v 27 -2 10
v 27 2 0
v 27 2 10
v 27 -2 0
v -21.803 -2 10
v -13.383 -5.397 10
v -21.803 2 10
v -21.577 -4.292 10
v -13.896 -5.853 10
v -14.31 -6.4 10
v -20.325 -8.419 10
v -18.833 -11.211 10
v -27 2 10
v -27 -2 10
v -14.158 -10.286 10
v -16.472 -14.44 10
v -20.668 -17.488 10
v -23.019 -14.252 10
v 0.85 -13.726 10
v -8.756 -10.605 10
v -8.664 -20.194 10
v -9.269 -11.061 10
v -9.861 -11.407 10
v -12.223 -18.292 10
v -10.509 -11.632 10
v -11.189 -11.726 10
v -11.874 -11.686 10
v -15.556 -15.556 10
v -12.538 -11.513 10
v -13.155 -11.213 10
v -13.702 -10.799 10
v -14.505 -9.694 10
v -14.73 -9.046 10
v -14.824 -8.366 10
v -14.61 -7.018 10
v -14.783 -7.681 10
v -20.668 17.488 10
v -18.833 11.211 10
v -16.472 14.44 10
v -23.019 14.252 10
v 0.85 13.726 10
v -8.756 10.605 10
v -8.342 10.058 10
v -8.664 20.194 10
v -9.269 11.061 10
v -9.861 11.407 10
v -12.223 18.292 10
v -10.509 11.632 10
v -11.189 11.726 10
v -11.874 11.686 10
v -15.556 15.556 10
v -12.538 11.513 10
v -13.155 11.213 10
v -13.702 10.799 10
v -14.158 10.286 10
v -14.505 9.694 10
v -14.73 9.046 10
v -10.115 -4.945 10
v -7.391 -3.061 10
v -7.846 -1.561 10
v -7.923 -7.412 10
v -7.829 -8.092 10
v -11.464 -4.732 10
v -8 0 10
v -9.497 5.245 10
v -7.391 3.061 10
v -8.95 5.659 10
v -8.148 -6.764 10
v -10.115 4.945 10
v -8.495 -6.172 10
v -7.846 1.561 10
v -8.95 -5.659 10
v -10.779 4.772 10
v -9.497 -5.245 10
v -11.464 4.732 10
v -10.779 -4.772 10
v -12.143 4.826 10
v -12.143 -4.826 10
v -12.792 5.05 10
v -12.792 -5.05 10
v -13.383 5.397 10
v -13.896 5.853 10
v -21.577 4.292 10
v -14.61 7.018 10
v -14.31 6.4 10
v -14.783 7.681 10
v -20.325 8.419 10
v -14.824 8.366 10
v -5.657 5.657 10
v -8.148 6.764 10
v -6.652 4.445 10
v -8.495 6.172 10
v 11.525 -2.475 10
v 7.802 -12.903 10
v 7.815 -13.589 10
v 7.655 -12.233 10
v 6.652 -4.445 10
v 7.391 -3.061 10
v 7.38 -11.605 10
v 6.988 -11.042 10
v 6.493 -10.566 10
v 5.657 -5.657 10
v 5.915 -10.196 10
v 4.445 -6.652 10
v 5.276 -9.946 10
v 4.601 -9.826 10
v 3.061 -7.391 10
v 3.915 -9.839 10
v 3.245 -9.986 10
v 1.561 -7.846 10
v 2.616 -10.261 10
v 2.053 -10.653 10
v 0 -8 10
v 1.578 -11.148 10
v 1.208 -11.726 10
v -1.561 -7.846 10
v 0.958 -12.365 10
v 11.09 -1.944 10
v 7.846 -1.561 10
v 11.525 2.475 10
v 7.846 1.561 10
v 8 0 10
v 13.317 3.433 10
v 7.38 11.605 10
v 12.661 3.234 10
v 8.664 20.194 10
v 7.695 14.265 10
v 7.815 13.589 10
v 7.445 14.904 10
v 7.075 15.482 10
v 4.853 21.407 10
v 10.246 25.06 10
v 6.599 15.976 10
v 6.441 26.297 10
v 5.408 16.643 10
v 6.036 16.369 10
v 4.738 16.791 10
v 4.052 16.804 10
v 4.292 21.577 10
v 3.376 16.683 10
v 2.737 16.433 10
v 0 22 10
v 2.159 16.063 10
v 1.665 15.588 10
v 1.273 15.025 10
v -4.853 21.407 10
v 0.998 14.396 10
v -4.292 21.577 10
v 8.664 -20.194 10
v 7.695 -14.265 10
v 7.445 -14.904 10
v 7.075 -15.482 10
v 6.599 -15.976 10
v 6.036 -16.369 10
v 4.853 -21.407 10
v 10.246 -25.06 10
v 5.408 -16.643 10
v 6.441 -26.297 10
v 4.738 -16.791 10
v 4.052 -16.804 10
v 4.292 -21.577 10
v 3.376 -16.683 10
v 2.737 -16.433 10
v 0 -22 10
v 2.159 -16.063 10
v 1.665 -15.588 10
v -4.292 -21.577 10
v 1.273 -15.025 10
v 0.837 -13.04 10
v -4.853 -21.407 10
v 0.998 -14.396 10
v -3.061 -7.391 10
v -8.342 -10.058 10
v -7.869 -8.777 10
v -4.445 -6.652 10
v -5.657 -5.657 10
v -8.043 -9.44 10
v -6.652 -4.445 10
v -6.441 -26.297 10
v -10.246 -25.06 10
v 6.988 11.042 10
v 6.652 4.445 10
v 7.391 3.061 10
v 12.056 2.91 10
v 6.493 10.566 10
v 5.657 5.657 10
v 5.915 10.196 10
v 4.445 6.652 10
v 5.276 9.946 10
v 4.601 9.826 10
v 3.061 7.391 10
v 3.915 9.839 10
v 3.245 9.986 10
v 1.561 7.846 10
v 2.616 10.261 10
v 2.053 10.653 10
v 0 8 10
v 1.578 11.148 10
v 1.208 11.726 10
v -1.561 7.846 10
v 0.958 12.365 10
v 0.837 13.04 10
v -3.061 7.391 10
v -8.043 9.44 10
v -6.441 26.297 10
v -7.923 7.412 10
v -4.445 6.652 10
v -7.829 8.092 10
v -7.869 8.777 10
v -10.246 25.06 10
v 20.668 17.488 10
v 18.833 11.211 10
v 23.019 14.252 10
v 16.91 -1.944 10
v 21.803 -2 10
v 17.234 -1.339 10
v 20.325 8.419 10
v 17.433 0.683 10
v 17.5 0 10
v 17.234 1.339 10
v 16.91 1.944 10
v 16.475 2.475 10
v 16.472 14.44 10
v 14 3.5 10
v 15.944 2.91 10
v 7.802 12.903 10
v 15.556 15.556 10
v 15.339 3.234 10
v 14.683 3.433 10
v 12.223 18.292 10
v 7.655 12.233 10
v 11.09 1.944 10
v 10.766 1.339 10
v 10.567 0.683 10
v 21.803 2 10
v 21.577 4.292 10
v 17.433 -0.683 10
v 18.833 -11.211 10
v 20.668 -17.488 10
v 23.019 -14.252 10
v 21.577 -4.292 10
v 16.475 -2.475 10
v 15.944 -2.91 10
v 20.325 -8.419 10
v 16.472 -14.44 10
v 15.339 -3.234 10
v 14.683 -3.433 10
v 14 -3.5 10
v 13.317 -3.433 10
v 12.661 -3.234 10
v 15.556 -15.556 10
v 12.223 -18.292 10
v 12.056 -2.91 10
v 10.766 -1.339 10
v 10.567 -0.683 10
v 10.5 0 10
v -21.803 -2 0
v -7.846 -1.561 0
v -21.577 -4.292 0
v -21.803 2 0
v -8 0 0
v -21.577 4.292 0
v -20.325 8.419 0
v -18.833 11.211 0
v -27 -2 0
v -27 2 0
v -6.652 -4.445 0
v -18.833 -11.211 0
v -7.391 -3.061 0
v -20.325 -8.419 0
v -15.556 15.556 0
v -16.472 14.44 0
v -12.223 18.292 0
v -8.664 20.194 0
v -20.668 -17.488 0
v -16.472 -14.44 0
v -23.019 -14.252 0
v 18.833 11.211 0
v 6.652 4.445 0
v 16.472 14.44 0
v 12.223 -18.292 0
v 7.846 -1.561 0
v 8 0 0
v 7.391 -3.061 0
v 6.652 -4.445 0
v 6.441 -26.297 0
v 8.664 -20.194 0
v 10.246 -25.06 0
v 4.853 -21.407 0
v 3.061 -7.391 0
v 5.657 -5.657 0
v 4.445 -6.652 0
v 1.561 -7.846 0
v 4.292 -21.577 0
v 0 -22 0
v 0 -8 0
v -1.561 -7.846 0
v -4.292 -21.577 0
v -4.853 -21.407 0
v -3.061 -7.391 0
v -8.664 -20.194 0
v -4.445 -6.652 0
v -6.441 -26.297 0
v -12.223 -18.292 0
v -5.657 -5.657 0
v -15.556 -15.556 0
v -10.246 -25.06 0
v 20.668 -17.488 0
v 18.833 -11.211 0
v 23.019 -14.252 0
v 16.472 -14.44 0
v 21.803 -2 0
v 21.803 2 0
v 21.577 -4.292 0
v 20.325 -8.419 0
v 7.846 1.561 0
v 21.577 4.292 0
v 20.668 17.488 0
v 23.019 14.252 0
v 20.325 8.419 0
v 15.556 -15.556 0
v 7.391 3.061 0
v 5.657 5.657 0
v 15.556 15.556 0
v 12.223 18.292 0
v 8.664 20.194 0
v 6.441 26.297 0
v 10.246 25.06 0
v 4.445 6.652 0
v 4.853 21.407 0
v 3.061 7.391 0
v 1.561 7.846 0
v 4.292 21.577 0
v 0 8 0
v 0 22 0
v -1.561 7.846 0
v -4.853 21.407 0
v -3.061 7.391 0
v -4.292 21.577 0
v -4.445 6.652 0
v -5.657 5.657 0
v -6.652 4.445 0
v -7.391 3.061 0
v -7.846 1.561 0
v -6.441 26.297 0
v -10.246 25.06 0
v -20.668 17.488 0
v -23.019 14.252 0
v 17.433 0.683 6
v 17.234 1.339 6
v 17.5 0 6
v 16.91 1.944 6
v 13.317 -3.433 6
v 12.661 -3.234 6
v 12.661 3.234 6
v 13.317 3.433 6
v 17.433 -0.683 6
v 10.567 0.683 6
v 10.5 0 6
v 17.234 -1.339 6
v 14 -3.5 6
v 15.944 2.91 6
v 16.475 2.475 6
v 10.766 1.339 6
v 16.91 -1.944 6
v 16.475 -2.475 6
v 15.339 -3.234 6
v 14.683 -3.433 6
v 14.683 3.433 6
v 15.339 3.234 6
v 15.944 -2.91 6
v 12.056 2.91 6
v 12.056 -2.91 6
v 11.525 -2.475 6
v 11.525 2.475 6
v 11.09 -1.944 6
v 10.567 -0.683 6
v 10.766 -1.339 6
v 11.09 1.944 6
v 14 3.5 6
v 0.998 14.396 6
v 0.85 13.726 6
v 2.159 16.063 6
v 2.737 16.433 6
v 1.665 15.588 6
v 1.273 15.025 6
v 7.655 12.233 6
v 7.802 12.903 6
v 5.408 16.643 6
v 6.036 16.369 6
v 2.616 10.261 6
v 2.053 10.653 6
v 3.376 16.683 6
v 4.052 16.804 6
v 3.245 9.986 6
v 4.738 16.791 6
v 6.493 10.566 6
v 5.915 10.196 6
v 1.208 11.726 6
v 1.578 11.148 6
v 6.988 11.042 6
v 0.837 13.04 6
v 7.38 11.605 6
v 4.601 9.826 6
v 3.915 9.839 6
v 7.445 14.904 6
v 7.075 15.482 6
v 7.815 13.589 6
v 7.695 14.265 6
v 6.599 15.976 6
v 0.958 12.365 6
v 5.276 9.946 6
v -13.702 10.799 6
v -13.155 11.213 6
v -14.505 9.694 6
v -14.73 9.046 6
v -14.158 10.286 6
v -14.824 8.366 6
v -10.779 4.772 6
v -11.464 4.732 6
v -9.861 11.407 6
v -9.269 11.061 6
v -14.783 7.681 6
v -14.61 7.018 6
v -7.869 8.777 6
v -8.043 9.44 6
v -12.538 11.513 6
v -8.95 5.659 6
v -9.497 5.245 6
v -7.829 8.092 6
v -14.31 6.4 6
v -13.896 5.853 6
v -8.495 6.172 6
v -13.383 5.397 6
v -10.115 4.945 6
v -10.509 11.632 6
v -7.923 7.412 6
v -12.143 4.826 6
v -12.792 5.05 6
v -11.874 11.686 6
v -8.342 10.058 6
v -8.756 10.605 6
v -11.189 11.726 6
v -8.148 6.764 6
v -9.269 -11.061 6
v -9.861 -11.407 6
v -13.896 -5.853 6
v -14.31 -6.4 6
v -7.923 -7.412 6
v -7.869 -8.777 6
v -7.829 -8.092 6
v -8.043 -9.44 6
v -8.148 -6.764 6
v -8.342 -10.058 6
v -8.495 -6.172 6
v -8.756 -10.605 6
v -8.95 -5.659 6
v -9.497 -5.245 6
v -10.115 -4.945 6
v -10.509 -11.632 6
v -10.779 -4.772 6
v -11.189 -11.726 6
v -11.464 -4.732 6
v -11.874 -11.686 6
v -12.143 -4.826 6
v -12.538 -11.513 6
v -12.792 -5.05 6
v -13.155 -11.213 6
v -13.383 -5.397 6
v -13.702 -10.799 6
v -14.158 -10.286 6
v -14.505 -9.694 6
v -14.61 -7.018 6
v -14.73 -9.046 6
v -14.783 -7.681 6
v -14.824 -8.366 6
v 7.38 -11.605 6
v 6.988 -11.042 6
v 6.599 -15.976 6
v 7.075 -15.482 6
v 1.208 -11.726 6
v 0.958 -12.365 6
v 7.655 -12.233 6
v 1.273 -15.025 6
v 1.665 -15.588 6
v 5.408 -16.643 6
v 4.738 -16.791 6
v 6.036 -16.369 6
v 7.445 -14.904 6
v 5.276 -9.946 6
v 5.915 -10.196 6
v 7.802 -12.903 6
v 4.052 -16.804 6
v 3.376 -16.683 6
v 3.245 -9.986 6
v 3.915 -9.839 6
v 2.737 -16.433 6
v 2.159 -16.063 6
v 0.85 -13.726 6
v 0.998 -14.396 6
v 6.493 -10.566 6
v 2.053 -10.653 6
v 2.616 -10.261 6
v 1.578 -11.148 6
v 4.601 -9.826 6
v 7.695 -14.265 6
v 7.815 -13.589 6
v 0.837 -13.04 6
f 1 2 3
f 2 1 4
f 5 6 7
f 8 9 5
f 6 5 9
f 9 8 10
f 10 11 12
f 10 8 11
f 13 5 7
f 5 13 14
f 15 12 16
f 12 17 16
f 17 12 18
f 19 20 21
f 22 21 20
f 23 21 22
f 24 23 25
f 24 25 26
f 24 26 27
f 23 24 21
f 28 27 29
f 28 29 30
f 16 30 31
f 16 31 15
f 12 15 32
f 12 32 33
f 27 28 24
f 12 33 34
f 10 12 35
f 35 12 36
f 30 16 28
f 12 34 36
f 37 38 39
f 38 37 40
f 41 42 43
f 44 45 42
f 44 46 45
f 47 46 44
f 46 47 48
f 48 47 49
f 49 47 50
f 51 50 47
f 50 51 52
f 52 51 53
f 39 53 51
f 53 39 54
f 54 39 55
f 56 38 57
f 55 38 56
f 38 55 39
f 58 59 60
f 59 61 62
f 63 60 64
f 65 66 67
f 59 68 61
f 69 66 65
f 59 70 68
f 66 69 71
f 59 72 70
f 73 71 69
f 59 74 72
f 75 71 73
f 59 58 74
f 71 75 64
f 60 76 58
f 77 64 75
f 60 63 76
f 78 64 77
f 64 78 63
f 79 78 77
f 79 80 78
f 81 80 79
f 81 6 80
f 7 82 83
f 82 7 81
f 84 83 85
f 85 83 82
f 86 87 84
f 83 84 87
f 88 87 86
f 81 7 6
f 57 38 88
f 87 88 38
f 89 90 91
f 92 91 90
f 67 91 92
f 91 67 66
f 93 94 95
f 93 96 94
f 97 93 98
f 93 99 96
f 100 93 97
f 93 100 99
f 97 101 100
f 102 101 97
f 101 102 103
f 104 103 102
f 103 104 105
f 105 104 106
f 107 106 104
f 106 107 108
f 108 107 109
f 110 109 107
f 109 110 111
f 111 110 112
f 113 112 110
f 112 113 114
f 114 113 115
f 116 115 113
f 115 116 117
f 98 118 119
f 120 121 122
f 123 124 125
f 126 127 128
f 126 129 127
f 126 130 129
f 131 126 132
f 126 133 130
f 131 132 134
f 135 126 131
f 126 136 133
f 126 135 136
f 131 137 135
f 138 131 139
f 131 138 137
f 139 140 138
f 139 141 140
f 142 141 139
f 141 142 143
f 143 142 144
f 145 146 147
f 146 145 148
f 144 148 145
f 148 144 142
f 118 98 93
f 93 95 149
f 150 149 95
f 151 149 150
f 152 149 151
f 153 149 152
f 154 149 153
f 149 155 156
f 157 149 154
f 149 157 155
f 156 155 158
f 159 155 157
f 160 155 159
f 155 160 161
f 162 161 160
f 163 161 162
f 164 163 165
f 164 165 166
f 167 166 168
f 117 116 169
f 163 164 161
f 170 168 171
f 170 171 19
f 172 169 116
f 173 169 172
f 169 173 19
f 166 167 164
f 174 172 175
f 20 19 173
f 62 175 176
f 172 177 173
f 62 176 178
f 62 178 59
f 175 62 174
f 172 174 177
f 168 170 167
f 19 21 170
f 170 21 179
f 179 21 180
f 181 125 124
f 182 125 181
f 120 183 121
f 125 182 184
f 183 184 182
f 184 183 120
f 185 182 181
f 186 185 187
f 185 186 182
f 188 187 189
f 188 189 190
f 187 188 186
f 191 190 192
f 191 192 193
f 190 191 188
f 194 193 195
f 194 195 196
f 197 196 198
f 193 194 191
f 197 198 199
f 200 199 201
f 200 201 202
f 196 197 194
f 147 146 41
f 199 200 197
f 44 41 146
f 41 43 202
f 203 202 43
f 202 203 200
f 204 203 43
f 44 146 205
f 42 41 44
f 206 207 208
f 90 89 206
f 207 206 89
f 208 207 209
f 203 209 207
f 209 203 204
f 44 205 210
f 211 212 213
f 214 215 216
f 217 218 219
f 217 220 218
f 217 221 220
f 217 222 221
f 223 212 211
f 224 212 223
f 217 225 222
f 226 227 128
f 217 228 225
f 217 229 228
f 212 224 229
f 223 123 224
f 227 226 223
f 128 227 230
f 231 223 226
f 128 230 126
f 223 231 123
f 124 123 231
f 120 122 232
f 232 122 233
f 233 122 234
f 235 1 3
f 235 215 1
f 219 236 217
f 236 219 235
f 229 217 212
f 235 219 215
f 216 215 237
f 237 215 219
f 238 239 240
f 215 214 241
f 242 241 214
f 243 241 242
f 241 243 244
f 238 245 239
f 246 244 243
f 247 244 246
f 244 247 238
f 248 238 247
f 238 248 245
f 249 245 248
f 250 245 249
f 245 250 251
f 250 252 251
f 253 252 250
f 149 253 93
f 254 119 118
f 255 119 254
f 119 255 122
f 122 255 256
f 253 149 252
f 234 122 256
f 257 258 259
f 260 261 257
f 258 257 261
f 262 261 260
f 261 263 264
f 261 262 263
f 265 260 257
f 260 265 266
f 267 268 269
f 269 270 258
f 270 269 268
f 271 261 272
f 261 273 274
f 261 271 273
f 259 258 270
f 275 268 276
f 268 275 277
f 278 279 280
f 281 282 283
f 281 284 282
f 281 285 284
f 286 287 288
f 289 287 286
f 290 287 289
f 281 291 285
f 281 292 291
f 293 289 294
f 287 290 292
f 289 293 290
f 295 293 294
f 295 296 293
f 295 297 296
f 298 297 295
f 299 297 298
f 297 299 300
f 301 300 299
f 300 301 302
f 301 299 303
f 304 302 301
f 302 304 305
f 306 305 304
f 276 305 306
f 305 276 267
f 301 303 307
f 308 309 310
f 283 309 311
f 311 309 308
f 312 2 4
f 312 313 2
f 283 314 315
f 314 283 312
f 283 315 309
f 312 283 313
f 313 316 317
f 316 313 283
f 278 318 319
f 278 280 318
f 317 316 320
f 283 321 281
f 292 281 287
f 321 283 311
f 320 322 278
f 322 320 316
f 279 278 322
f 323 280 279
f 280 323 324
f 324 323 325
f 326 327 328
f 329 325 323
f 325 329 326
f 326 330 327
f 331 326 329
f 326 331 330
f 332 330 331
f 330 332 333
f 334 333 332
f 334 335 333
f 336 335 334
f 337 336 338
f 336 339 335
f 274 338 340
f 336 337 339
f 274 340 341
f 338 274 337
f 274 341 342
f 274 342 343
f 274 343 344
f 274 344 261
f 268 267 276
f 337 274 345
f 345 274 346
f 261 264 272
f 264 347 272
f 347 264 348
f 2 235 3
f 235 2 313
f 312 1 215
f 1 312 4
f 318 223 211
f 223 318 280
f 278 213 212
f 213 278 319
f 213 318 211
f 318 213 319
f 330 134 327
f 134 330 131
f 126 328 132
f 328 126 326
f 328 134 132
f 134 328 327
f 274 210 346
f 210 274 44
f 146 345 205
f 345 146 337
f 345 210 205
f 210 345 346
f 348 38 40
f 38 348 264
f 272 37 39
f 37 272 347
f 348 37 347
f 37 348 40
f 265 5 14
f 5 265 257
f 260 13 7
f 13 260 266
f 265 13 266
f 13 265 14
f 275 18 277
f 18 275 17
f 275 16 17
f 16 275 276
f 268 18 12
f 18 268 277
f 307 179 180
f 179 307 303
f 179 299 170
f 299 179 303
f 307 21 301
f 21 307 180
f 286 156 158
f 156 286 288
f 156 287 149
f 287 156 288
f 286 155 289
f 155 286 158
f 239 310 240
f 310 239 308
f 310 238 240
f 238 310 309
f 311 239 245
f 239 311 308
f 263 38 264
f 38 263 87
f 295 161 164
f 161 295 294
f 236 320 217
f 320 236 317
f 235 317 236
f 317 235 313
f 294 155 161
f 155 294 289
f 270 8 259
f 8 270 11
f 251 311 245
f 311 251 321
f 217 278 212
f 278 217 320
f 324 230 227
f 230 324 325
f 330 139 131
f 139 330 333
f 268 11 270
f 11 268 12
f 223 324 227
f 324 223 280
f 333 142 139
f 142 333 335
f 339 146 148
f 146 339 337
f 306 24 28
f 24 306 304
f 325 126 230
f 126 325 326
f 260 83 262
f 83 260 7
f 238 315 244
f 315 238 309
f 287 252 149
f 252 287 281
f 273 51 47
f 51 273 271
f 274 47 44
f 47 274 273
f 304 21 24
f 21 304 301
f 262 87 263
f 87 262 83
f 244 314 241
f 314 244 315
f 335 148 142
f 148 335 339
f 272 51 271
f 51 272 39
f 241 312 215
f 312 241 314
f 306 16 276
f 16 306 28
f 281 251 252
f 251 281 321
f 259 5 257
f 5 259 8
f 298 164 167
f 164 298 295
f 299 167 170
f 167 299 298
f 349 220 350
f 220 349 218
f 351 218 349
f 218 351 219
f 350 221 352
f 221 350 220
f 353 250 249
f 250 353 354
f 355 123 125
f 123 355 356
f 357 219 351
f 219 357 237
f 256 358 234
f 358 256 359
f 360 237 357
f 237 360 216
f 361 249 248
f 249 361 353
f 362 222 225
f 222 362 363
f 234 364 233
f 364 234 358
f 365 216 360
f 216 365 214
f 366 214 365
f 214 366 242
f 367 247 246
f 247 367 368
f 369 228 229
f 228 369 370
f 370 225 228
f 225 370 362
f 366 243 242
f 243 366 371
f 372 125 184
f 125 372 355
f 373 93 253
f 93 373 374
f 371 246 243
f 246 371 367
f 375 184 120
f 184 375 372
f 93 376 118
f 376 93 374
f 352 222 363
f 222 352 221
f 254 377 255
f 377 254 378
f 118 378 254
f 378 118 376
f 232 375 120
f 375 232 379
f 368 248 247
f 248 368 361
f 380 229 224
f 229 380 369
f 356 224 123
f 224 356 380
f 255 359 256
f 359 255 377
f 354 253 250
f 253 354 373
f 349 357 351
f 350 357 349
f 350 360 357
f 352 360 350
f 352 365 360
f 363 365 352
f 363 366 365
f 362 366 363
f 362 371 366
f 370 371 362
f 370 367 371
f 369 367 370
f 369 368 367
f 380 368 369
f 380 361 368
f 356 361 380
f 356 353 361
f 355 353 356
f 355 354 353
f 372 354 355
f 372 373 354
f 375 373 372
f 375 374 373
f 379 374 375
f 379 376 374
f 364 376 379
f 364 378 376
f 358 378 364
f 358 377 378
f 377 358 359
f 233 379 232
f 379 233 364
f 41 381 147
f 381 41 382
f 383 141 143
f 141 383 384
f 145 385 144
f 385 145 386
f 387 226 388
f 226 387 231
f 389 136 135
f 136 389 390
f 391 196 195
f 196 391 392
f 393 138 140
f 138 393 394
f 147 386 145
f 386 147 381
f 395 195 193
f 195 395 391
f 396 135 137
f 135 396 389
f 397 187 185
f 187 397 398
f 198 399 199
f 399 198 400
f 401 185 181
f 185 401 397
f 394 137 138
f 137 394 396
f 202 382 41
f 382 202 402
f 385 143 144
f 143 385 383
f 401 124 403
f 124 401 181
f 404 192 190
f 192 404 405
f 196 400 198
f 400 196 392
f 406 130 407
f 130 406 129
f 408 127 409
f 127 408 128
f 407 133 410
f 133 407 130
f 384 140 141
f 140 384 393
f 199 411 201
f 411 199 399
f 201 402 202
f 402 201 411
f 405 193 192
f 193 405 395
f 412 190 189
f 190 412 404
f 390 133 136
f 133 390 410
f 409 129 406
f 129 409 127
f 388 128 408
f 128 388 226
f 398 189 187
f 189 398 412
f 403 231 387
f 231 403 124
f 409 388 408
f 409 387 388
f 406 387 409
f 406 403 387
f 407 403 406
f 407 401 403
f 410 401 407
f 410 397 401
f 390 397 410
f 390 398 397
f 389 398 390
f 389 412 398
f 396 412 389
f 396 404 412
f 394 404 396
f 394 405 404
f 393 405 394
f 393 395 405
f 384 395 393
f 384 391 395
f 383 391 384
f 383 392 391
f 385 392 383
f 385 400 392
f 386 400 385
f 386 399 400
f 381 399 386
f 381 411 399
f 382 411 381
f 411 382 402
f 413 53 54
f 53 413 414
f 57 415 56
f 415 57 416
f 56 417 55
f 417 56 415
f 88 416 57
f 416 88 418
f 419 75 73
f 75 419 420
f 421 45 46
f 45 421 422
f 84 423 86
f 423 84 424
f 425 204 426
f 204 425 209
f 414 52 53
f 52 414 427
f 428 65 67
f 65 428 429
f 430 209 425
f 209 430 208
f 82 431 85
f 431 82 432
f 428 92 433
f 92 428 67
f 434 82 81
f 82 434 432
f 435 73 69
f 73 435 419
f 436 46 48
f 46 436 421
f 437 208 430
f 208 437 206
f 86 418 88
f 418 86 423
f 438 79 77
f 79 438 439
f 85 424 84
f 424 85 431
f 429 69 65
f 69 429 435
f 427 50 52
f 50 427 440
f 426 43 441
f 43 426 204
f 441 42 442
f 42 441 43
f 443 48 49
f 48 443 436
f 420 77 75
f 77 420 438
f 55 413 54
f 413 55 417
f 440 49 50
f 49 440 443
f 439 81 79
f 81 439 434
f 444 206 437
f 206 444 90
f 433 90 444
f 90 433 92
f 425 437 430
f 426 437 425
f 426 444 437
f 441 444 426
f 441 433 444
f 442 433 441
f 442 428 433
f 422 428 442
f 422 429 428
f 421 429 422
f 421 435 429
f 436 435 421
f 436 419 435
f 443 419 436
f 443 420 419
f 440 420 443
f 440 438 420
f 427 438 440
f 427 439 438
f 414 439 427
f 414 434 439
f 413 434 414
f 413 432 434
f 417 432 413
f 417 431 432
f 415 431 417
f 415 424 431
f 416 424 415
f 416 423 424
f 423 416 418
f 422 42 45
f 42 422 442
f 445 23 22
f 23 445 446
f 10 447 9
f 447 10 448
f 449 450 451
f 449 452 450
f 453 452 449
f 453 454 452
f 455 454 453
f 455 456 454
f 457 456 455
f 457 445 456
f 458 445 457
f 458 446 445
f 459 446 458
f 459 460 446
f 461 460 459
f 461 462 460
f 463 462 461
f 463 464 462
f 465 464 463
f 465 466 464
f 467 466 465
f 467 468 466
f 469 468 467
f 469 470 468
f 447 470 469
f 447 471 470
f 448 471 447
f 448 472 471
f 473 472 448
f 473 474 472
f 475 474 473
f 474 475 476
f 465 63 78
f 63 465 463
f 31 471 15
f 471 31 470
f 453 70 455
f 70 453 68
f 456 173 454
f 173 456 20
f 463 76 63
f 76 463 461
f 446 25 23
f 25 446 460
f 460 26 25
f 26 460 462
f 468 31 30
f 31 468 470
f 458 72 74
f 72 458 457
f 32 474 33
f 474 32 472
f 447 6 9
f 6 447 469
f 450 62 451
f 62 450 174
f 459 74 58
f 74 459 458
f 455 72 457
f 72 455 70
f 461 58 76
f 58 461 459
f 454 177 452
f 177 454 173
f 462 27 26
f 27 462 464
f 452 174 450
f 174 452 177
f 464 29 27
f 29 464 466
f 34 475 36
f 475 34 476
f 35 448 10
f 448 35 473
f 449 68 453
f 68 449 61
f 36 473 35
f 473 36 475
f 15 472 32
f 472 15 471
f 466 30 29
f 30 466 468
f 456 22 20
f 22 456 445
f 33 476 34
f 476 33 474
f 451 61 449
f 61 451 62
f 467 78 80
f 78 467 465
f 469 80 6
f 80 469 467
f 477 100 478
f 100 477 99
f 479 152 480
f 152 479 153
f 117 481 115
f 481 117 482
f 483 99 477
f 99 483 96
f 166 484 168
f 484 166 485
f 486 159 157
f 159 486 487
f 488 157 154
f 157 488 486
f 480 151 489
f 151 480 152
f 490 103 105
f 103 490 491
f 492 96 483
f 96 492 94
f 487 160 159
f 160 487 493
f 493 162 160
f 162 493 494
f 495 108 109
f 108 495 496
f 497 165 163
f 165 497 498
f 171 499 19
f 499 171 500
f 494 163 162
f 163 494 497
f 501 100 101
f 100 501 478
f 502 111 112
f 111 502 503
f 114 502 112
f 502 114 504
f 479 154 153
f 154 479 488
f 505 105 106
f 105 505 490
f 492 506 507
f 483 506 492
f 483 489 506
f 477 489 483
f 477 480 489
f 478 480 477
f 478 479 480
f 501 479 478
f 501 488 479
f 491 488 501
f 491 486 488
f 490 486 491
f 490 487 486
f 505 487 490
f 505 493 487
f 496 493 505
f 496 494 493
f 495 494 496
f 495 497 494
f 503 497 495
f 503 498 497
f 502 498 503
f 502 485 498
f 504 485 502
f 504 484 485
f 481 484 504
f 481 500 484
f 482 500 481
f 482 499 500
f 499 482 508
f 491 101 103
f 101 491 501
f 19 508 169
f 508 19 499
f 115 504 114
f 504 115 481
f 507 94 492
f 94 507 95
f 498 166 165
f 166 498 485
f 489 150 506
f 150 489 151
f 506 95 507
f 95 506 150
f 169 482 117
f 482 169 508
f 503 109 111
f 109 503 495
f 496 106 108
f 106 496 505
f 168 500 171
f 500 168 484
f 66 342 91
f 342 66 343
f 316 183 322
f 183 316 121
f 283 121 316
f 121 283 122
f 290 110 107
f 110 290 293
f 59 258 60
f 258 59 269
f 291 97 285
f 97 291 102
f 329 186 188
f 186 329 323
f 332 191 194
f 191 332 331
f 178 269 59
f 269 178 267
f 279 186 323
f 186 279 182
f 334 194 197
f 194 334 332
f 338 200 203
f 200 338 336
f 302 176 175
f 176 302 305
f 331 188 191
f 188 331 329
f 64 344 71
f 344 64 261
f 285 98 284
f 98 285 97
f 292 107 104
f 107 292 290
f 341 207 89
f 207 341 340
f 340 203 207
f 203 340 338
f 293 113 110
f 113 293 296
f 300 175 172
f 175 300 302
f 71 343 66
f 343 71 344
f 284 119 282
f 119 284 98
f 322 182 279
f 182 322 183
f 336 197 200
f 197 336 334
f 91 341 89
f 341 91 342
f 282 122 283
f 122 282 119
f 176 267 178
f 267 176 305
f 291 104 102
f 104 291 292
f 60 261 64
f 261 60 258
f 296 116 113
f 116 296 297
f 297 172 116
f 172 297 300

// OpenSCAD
$fn = 32;

// ----------------------------------------------------------------------
// Spur blank: lightened gear blank
// ----------------------------------------------------------------------

// --- parameters (mm) ---
disc_r = 22;              // blank root radius
disc_t = 10;              // blank thickness
n_teeth = 10;             // stub tooth count
tooth_w = 4;              // tooth width at the root
tooth_h = 5;              // tooth height above the root
bore_r = 8;               // central bore radius
ring_r = 14;              // lightening pocket ring radius
pocket_r = 3.5;           // lightening pocket radius

out_r = disc_r + tooth_h;  // tip radius
bbox_x = 54.0;  // measured width over the teeth
bbox_y = 52.59;  // measured depth over the teeth

difference() {
union() {
  cylinder(r = disc_r, h = disc_t);
  for (i = [0 : n_teeth - 1])
    rotate([0, 0, i * 360 / n_teeth])
      translate([disc_r - 1, -tooth_w / 2, 0])
        cube([tooth_h + 1, tooth_w, disc_t]);
}
  translate([0, 0, -1]) cylinder(r = bore_r, h = disc_t + 2);
  for (i = [0 : 5])
    rotate([0, 0, i * 72])
      translate([ring_r, 0, disc_t - 4])
        cylinder(r = pocket_r, h = 5);
}
